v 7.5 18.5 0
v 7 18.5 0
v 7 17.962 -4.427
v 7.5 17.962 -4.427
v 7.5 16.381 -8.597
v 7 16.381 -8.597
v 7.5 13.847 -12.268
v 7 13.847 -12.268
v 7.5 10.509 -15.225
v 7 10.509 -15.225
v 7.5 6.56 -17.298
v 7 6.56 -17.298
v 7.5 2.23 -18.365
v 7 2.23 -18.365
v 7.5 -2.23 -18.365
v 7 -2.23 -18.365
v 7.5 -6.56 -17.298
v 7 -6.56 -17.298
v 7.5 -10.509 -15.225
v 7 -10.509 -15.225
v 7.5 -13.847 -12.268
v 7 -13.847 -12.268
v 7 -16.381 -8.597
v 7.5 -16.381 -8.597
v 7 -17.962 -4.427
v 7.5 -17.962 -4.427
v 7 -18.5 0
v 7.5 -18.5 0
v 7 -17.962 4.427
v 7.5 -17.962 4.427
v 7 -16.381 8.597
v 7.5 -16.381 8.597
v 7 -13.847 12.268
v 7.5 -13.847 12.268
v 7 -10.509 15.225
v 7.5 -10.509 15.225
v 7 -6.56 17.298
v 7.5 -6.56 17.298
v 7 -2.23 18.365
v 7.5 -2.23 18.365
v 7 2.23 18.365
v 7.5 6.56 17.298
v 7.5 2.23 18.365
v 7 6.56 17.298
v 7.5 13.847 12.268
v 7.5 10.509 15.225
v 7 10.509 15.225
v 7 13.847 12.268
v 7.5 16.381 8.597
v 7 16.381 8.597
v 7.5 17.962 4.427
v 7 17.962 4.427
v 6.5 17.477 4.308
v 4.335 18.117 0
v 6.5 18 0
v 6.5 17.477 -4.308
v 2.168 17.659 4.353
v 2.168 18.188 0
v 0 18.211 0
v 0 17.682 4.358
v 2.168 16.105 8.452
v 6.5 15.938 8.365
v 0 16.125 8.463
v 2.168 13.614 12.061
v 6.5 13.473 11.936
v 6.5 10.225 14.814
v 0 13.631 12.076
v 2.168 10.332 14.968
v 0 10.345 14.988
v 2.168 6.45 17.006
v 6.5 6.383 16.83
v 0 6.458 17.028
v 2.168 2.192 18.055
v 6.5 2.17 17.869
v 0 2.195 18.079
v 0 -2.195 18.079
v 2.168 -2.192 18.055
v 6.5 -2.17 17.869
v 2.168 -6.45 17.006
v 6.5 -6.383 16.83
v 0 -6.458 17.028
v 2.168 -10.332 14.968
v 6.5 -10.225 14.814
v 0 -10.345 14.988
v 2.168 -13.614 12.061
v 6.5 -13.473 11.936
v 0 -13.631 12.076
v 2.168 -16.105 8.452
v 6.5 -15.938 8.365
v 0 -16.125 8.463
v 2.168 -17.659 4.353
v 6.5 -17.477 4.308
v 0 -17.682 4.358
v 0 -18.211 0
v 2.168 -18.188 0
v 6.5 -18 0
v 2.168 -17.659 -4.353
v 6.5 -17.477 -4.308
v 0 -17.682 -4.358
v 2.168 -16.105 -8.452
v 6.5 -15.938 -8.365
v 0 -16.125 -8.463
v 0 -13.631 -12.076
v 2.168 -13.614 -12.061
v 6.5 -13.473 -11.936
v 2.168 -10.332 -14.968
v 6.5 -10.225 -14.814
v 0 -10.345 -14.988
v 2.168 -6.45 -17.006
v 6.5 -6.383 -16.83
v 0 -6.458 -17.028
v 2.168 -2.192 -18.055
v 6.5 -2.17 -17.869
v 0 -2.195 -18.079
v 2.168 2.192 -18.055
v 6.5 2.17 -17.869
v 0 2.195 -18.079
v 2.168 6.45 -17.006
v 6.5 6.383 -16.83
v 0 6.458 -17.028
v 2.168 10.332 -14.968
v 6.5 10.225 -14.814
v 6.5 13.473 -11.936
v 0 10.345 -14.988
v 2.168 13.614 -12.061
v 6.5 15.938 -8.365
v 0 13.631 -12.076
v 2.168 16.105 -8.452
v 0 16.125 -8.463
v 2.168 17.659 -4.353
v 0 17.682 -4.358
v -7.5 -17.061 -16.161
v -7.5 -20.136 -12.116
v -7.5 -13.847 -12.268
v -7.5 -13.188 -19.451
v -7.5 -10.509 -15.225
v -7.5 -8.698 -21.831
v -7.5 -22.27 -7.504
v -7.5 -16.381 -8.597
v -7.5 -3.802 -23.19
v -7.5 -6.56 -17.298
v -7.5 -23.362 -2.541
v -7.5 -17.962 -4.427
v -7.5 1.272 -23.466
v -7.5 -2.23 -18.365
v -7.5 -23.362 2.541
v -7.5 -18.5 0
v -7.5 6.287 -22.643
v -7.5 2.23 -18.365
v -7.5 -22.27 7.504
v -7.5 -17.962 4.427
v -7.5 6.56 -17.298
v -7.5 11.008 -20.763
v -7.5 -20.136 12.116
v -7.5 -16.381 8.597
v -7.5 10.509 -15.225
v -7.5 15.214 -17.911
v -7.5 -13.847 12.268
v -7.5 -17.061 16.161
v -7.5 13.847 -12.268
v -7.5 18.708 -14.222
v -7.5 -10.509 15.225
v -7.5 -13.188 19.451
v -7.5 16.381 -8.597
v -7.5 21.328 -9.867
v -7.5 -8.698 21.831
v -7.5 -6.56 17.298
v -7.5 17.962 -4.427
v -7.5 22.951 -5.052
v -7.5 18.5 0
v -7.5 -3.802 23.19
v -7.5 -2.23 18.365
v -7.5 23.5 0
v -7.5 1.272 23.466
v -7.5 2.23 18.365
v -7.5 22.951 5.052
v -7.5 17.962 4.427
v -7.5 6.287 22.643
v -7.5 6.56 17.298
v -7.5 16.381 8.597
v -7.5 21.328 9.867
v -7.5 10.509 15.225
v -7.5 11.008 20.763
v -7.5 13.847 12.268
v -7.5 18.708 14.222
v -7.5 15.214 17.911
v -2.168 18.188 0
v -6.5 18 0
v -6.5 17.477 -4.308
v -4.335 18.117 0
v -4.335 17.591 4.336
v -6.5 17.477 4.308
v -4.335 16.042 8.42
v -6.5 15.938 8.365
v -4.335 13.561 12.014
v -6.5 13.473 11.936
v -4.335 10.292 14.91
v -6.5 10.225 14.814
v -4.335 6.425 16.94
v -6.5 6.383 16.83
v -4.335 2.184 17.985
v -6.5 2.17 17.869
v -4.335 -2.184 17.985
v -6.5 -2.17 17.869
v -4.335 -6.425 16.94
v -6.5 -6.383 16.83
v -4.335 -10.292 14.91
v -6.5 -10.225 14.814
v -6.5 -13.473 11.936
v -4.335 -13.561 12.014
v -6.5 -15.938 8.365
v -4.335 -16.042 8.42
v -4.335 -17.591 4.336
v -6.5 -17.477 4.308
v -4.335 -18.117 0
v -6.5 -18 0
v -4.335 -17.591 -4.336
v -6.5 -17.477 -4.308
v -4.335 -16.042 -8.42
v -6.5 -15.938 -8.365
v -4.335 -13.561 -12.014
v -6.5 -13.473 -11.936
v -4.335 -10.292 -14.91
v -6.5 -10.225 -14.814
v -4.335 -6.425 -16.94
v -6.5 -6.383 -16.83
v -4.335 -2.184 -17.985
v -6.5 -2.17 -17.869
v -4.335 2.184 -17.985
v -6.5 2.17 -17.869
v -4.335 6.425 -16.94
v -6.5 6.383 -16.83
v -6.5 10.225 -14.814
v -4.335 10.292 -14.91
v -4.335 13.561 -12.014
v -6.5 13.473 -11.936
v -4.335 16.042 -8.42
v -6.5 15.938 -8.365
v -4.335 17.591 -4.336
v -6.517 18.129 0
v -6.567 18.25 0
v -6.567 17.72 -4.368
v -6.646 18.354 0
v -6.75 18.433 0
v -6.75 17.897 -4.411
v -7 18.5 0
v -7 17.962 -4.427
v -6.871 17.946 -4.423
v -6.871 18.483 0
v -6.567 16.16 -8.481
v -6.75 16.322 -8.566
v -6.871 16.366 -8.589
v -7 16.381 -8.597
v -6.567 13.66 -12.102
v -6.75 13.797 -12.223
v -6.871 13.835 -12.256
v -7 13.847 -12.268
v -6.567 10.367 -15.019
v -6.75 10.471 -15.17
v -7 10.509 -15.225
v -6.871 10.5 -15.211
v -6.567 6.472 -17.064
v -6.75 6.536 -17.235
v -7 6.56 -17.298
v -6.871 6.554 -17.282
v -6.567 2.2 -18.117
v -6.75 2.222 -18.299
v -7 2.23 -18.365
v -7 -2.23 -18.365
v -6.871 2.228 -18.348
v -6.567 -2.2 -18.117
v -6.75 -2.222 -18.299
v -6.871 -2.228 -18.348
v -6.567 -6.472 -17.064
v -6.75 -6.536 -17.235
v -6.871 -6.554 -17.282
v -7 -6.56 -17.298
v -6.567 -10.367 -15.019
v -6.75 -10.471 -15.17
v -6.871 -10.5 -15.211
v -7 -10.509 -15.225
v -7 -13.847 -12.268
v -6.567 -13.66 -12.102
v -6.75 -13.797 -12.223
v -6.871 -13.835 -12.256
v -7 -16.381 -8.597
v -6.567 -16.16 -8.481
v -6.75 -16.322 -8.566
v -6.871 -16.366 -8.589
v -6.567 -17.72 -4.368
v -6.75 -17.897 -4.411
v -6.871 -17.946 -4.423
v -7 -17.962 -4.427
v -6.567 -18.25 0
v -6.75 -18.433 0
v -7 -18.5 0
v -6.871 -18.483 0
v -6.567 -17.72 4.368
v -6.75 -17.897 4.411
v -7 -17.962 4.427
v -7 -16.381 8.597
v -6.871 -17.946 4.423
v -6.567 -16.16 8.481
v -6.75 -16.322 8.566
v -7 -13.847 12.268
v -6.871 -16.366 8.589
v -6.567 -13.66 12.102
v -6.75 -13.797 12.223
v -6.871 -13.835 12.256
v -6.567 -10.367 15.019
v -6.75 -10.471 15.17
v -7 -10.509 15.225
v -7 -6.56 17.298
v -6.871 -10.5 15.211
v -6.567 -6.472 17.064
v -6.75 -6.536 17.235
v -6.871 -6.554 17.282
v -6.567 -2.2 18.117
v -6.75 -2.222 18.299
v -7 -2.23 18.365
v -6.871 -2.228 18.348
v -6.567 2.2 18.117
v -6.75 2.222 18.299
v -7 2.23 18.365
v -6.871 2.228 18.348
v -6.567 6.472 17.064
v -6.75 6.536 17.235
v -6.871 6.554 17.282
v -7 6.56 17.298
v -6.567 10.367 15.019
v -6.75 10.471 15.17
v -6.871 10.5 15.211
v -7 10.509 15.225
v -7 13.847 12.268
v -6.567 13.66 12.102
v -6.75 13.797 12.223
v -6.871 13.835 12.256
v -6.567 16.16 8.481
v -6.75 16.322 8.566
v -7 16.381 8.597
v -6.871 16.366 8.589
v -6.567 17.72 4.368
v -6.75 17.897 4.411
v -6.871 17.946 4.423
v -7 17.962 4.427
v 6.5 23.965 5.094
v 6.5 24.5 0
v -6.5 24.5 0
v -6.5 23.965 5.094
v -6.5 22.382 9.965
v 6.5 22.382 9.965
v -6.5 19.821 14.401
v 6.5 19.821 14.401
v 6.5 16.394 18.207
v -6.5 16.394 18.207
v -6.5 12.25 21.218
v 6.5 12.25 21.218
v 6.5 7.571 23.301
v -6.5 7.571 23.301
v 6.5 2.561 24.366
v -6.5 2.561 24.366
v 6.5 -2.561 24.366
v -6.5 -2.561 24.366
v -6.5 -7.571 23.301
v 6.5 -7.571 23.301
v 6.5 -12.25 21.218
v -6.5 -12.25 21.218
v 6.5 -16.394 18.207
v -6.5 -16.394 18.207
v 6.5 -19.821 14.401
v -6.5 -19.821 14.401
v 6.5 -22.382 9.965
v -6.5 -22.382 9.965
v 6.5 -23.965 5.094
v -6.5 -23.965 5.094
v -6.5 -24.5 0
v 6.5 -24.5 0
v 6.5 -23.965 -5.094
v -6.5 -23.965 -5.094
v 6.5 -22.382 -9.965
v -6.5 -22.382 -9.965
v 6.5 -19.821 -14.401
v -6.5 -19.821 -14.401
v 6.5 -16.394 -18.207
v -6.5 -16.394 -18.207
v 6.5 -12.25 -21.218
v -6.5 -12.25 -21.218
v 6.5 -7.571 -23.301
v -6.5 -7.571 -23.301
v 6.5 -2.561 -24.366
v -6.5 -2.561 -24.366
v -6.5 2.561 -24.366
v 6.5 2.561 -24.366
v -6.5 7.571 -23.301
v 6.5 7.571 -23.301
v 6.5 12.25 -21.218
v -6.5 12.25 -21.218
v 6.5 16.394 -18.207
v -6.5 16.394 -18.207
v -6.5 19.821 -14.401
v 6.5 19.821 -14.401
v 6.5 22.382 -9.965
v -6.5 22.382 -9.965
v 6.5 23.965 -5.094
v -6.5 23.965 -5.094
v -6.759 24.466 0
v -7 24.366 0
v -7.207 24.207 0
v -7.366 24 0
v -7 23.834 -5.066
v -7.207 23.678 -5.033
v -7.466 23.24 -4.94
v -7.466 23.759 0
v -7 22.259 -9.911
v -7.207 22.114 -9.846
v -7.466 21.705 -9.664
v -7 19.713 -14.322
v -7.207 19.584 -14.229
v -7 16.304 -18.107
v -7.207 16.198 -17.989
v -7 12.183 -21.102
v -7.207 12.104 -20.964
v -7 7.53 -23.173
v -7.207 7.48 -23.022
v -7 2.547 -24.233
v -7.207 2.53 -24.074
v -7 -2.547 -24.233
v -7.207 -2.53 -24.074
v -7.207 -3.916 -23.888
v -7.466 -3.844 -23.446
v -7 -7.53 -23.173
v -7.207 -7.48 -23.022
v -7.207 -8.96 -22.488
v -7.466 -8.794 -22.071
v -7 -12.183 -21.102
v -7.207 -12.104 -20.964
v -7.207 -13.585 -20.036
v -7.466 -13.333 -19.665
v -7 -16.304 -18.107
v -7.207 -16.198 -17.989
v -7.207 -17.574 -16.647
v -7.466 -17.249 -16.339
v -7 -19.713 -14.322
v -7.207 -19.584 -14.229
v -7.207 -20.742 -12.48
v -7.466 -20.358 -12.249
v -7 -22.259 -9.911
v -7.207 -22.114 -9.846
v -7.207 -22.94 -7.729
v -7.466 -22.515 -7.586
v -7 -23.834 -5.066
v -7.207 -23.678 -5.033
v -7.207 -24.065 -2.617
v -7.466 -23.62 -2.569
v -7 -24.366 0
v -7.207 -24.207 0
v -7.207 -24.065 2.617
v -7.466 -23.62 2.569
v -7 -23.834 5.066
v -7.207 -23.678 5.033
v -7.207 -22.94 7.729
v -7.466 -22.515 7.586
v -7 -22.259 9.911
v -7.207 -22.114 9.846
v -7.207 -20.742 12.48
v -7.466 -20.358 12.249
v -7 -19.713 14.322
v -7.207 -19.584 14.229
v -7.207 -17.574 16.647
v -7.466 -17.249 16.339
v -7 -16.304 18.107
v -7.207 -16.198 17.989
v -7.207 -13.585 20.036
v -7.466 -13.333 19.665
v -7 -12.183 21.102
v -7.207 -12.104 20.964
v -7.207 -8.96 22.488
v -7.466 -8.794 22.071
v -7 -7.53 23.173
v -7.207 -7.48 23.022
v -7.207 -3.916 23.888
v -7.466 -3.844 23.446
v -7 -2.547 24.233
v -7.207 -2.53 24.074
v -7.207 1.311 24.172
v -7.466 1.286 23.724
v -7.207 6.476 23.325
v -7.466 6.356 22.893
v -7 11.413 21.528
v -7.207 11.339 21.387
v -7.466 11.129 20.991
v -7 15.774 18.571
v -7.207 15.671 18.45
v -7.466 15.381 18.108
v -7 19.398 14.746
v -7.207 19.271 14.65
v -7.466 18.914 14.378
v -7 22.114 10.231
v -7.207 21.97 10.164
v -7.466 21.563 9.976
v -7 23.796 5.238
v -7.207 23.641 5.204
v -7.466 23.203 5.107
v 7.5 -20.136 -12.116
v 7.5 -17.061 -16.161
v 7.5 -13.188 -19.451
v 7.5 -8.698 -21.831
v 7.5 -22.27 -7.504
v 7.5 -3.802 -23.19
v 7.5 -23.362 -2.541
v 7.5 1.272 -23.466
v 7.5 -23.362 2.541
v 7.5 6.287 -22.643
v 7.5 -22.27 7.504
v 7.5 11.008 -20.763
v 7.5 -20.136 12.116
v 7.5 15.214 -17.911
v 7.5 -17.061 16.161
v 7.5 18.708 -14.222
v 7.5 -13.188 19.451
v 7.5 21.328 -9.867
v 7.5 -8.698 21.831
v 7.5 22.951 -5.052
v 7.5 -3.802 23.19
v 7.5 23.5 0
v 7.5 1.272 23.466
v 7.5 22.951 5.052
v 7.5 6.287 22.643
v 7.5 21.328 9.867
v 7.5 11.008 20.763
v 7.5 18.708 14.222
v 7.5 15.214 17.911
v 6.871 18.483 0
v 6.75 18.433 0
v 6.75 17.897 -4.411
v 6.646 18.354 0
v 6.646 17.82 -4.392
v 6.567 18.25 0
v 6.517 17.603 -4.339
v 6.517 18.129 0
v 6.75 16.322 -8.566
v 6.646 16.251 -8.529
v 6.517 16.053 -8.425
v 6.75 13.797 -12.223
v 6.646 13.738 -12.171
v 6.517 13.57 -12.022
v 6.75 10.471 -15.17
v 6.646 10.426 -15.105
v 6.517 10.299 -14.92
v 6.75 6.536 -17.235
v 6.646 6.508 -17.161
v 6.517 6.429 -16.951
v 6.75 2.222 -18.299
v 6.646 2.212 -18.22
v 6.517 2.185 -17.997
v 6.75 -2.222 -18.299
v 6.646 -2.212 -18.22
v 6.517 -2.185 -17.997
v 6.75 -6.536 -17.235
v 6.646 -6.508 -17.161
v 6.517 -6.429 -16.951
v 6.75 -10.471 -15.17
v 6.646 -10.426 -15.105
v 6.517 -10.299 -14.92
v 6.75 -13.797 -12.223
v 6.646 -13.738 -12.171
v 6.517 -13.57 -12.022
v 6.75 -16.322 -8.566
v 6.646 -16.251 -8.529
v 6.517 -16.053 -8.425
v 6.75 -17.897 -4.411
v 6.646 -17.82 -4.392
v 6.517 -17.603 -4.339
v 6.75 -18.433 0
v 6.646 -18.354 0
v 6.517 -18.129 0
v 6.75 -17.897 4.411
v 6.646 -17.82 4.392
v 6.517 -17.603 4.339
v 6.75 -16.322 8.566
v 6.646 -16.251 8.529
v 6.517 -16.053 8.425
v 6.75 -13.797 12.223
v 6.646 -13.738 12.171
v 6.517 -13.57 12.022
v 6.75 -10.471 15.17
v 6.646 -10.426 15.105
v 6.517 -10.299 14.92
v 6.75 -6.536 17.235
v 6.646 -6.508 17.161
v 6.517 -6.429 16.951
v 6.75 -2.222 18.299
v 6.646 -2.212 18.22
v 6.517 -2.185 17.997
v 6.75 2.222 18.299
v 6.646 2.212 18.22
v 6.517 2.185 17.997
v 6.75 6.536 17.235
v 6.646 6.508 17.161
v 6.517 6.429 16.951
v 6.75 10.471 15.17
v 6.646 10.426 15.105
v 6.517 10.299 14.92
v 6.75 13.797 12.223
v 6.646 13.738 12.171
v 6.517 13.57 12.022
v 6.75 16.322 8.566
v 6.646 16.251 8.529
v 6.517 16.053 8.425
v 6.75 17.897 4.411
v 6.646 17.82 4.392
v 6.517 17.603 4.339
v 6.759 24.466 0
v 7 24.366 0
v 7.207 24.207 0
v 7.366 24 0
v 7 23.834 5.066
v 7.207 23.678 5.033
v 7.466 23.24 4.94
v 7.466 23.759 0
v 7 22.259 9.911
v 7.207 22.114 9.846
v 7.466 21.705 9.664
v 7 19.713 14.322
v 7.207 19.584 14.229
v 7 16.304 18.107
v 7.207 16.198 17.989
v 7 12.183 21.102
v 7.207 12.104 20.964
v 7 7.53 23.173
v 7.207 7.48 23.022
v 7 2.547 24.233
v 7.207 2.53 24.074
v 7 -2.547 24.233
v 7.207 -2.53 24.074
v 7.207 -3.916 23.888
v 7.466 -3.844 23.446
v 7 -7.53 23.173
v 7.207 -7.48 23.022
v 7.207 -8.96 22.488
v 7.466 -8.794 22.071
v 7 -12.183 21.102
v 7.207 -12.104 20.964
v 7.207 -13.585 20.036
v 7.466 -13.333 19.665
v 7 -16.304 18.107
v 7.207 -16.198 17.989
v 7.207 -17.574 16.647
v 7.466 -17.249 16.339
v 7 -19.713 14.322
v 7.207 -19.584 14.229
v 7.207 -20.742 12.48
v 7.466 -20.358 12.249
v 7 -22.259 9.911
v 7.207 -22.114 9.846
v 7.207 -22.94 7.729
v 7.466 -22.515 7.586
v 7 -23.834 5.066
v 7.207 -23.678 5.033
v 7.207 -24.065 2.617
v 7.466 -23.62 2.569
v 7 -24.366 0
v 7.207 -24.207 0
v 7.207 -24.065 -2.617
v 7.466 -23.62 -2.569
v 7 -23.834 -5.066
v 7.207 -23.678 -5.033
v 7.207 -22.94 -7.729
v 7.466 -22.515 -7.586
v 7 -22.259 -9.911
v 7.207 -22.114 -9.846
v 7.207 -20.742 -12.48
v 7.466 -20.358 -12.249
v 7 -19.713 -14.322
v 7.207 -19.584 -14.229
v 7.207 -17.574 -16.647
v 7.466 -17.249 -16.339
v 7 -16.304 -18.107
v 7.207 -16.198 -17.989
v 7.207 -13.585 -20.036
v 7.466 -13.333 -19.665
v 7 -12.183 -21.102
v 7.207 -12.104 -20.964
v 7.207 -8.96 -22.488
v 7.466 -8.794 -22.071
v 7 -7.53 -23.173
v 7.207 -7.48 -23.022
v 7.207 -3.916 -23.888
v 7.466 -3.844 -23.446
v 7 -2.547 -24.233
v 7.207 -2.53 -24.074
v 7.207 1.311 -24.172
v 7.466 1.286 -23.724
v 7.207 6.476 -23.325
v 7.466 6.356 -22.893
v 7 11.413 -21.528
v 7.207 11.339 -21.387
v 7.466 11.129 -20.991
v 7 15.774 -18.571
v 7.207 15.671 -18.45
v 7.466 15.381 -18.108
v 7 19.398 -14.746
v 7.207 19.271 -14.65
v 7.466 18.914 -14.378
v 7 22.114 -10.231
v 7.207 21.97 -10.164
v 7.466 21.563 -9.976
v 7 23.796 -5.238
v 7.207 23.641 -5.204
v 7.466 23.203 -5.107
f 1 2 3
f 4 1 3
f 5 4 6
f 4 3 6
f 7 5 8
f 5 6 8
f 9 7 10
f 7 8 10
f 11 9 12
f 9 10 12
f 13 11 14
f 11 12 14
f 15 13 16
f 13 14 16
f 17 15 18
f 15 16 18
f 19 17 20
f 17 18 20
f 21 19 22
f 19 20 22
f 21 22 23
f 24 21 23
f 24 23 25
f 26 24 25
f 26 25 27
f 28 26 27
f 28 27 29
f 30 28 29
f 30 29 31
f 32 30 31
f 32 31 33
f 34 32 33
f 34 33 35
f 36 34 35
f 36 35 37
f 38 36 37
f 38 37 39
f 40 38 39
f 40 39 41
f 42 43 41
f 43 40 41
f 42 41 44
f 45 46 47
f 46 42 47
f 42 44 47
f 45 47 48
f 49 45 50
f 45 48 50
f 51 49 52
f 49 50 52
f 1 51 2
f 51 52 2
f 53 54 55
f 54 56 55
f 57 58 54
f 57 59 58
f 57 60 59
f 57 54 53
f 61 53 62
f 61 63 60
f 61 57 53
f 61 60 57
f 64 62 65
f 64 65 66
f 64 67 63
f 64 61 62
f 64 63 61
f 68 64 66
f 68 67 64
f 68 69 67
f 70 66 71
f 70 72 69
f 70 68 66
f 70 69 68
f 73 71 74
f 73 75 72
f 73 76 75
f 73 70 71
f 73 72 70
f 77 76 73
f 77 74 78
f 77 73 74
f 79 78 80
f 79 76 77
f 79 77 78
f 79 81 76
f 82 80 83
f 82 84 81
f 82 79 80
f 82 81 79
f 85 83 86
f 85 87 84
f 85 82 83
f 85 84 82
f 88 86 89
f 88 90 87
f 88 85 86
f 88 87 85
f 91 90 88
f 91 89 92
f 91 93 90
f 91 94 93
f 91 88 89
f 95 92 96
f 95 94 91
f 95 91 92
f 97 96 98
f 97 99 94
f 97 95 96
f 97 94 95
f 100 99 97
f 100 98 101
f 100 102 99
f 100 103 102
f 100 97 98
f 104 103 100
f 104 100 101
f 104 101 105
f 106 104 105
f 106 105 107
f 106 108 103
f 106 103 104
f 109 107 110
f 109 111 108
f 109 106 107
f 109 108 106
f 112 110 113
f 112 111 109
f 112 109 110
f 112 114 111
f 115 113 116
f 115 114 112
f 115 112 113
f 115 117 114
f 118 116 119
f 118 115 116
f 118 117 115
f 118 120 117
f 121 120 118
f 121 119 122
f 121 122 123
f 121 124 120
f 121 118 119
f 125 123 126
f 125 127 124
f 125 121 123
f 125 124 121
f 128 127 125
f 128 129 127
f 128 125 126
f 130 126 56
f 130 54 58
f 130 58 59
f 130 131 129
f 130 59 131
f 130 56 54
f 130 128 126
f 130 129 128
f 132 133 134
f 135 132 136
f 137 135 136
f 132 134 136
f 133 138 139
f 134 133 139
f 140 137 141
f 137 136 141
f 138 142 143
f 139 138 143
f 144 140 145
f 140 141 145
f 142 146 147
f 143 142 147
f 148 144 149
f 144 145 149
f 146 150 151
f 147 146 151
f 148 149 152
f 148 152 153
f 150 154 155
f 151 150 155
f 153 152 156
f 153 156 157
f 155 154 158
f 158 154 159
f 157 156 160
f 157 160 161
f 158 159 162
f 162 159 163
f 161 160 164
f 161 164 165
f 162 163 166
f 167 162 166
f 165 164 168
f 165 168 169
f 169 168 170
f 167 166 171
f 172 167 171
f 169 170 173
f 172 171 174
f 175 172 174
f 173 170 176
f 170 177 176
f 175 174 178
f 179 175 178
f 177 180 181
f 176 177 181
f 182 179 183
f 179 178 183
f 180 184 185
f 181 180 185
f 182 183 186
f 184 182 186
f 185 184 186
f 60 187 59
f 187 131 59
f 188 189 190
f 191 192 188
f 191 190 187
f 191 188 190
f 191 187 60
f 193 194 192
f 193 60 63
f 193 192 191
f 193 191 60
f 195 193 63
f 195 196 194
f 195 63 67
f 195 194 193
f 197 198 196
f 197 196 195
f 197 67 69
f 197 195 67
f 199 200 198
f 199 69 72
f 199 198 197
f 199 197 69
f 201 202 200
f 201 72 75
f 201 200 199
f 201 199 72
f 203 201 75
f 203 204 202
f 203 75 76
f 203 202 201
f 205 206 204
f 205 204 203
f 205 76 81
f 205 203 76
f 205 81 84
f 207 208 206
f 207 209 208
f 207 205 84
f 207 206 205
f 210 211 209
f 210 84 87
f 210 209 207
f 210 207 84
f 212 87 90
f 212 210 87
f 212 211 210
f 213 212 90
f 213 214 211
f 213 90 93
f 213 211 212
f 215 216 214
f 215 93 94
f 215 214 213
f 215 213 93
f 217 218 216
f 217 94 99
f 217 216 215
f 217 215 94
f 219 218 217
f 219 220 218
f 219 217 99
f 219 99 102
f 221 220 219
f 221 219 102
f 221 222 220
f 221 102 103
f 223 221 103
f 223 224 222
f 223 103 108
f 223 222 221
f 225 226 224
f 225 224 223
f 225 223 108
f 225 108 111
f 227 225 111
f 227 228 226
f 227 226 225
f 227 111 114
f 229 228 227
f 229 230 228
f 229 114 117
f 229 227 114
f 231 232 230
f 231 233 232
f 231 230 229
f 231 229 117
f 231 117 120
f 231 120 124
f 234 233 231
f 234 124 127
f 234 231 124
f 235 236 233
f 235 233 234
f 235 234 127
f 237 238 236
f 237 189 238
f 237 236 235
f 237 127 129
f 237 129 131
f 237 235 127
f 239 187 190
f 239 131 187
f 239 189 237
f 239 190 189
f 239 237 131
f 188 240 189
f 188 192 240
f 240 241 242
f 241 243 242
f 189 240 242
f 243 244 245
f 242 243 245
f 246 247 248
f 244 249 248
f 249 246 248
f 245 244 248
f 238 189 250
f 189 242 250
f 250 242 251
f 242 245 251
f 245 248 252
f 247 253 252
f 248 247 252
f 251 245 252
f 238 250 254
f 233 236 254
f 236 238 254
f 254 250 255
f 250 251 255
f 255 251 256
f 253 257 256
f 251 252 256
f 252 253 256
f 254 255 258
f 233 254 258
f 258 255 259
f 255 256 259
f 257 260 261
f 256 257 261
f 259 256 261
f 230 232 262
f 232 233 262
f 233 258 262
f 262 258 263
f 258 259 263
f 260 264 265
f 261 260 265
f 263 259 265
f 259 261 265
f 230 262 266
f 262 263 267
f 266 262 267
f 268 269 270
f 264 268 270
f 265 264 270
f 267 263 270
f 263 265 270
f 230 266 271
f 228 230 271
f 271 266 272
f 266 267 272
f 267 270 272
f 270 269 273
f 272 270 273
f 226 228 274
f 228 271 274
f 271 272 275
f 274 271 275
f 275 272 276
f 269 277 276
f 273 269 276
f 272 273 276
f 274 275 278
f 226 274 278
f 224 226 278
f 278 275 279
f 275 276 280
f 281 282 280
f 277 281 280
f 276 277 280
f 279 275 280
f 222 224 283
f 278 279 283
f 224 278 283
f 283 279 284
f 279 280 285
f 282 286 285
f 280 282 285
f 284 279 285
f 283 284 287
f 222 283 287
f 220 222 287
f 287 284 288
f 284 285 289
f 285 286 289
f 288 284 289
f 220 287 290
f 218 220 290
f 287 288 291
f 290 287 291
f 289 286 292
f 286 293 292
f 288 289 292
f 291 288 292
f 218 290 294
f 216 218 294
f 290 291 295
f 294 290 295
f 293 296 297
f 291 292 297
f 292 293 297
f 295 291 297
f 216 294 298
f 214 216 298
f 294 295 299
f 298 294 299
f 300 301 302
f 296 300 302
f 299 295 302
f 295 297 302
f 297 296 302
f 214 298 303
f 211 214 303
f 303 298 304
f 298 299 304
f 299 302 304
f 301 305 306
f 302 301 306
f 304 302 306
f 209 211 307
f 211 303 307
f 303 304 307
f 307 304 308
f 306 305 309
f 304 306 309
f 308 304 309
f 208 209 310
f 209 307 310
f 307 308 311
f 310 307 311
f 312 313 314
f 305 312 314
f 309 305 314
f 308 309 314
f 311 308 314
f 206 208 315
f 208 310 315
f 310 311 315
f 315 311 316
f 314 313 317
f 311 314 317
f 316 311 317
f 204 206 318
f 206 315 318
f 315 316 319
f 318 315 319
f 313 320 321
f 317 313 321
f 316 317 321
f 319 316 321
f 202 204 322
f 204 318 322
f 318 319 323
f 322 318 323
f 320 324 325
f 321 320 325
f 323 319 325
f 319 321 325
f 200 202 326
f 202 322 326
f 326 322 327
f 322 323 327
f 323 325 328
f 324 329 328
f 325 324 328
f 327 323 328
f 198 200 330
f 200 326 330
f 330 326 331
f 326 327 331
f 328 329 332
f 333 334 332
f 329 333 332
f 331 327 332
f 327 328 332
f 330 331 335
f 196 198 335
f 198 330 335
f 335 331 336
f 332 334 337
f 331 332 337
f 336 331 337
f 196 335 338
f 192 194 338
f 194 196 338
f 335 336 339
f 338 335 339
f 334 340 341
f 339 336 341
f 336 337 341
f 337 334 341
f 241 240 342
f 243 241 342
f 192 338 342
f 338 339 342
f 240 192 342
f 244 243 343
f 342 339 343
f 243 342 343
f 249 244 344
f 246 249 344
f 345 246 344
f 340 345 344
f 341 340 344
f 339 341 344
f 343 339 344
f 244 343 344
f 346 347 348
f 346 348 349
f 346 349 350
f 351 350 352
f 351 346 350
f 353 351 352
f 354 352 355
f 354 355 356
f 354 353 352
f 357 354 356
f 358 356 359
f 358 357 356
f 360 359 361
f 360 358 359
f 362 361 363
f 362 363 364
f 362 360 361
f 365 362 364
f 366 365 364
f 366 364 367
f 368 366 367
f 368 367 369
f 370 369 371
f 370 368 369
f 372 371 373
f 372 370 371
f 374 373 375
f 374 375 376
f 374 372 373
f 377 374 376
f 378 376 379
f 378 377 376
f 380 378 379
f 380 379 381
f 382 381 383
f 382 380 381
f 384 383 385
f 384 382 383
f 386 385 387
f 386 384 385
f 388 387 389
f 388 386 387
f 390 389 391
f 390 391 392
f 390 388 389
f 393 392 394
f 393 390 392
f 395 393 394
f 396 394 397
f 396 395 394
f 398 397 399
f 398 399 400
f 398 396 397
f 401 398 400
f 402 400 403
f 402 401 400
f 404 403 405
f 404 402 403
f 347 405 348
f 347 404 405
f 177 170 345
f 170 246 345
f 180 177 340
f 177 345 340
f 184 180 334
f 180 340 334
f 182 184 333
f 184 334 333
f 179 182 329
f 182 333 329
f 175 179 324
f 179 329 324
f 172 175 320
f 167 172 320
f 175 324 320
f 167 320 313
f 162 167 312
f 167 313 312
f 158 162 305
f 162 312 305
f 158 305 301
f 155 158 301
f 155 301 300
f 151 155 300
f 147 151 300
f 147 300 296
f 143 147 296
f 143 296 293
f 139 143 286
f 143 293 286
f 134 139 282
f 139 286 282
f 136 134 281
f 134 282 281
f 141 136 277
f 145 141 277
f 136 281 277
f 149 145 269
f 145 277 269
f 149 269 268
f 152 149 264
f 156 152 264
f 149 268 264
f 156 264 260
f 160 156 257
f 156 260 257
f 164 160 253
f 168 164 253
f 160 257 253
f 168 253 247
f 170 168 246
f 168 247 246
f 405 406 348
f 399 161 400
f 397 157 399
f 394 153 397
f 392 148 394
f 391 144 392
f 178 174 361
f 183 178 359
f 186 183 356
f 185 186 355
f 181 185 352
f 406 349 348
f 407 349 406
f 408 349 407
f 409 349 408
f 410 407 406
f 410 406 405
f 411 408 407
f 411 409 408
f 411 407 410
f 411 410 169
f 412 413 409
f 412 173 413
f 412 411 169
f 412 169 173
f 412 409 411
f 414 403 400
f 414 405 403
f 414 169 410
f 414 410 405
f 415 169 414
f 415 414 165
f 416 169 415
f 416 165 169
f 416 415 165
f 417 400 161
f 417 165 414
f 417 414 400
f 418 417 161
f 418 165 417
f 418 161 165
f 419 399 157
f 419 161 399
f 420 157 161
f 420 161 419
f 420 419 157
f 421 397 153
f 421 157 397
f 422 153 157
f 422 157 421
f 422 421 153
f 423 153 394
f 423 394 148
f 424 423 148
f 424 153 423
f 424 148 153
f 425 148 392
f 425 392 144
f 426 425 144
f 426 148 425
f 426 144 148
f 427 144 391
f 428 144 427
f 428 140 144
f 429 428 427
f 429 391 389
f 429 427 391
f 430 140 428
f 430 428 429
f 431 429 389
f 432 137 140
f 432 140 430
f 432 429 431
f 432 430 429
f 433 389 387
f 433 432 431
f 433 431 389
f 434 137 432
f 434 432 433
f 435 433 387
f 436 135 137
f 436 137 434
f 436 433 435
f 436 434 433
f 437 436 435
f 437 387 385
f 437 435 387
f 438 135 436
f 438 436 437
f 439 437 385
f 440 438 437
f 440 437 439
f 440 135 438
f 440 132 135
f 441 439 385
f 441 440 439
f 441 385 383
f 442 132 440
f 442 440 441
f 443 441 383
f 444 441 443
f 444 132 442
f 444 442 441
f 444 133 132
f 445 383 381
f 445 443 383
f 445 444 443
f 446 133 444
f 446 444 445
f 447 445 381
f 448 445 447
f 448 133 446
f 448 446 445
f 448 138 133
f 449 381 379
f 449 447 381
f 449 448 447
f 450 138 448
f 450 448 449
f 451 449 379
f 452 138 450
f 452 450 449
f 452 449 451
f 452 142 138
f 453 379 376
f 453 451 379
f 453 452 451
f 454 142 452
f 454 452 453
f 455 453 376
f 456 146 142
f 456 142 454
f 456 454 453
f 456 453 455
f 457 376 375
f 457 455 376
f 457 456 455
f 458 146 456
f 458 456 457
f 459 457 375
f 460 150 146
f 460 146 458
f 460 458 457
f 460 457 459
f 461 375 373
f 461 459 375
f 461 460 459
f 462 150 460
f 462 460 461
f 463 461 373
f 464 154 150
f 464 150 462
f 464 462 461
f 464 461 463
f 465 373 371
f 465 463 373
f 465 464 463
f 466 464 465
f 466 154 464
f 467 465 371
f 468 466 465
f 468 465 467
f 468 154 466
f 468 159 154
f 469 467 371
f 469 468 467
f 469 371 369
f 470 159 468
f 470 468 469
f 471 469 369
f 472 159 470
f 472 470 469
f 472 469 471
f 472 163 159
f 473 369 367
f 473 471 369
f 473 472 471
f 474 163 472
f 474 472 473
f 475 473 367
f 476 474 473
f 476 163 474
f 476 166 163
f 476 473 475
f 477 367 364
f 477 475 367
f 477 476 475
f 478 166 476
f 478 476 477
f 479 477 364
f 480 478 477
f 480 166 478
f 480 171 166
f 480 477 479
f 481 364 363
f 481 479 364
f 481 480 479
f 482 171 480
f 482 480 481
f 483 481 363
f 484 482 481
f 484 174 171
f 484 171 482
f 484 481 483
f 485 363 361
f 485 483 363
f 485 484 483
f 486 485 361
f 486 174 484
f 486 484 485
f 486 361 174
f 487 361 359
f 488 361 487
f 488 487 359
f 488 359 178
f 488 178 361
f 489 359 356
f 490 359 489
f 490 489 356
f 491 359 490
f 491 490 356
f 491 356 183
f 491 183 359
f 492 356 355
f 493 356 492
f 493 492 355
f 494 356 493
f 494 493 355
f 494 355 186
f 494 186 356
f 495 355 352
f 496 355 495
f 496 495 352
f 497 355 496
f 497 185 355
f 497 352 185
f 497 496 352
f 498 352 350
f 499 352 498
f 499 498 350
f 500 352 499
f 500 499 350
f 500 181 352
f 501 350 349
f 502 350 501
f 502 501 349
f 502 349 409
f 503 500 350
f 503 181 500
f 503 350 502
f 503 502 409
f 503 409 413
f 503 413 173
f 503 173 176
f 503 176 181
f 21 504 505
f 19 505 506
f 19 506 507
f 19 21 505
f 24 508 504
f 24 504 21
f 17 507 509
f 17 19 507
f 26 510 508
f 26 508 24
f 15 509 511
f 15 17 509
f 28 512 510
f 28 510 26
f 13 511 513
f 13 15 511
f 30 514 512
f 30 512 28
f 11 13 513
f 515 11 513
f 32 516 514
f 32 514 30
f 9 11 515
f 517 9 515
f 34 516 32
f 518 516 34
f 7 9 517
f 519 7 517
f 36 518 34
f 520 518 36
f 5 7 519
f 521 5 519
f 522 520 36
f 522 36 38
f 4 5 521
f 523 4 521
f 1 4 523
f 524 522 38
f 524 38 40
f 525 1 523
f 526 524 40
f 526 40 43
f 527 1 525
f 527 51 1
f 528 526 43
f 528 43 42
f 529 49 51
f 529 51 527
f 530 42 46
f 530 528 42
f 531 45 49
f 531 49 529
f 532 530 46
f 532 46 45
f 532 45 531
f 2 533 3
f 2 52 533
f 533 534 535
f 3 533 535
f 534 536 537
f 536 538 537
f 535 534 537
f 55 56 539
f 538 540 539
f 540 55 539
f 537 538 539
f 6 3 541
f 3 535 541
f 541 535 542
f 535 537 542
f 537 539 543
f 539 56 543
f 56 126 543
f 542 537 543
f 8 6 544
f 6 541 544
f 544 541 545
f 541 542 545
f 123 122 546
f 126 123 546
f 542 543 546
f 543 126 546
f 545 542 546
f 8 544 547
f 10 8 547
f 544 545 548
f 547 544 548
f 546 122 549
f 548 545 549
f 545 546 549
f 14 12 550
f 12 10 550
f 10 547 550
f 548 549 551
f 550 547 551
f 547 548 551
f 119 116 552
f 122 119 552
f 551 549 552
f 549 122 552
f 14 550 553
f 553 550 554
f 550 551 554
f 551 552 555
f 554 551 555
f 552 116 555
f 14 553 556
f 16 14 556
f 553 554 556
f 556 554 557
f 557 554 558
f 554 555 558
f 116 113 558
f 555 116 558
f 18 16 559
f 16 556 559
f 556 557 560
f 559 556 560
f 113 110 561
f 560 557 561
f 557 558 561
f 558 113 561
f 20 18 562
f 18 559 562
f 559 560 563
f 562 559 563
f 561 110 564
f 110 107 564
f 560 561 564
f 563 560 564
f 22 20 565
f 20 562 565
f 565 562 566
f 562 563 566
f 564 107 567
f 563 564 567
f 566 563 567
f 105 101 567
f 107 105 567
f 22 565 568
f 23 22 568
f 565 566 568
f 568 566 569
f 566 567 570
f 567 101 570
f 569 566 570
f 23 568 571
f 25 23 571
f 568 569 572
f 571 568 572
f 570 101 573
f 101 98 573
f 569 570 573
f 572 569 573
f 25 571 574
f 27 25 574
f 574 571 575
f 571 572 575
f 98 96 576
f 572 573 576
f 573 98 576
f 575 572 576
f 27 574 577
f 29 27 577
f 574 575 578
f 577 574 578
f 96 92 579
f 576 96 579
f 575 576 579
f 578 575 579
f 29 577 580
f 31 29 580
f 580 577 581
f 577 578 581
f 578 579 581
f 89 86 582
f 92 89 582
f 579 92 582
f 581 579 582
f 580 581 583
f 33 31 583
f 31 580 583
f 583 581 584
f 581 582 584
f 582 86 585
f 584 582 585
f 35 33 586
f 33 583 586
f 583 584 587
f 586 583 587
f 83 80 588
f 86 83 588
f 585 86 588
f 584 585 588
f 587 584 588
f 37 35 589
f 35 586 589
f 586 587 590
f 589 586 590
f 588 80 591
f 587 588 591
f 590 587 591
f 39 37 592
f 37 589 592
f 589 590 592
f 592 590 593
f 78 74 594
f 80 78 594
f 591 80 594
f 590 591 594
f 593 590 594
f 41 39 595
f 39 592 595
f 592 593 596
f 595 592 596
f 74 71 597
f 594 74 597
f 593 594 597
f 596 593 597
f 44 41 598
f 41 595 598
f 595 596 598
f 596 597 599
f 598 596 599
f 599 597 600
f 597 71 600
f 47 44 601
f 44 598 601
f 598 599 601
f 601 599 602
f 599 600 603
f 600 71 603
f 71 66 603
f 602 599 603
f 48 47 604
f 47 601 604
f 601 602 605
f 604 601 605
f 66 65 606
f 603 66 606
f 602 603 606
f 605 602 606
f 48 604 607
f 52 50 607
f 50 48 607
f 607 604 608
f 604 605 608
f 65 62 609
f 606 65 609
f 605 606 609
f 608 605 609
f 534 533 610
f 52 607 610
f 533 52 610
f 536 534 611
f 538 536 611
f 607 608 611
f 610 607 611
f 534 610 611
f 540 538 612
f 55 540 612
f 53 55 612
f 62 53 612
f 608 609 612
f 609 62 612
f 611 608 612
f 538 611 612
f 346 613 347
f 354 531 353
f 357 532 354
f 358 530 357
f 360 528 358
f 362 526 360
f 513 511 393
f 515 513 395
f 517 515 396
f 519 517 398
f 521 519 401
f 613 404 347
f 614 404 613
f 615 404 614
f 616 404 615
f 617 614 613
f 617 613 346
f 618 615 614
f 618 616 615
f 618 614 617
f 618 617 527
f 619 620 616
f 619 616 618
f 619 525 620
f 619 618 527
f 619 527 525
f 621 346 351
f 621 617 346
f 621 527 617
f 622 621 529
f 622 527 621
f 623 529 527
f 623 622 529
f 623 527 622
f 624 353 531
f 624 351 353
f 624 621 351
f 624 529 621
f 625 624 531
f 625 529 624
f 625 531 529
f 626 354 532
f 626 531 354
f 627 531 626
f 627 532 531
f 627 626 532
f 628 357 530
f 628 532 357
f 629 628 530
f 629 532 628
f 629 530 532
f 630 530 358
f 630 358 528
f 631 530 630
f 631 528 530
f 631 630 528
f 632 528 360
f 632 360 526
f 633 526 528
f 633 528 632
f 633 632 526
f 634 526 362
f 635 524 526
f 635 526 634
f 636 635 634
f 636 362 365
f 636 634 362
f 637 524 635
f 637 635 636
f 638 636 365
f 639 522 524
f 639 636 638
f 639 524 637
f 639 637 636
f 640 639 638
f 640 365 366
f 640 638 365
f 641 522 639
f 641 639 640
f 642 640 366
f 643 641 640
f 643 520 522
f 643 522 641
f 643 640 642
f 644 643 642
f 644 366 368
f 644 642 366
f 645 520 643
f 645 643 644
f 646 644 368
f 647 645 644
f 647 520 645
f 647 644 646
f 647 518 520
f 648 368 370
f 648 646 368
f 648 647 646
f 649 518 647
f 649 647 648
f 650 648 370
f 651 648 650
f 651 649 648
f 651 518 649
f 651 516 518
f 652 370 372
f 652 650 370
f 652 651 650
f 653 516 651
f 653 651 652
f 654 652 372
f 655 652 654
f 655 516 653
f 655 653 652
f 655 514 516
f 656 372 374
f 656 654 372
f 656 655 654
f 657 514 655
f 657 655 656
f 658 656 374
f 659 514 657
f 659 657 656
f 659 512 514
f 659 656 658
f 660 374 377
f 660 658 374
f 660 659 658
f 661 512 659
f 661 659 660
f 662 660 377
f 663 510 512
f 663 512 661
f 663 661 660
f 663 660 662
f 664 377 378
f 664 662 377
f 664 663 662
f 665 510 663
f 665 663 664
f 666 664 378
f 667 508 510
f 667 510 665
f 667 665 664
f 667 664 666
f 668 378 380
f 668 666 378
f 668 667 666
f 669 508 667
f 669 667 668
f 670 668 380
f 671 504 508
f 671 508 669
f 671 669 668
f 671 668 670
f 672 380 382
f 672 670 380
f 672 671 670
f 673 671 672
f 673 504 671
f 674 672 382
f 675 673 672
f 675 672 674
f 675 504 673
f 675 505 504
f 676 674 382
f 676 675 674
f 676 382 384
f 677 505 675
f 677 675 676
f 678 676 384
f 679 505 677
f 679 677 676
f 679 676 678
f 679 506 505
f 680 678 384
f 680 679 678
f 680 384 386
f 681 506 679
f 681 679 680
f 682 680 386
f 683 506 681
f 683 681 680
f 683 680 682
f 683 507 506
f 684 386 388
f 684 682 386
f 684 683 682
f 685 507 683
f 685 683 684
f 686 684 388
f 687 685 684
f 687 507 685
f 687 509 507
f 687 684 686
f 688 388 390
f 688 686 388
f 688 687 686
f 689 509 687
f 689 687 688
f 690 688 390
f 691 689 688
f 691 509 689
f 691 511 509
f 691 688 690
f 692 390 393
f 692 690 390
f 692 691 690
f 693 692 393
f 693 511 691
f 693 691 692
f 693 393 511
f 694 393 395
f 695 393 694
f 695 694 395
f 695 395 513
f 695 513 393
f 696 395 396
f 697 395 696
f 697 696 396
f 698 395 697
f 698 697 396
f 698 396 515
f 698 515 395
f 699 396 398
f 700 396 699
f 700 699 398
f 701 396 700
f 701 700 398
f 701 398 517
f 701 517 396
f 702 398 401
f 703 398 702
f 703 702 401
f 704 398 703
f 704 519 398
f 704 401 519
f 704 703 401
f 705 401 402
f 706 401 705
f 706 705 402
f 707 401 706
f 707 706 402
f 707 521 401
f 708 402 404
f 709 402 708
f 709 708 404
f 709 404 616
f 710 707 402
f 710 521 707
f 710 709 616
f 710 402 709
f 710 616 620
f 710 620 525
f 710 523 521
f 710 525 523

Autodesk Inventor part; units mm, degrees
ref_plane "YZ Plane" through (0, 0, 0) normal (1, 0, 0) x (0, 1, 0)
ref_plane "XZ Plane" through (0, 0, 0) normal (0, 1, 0) x (-1, 0, 0)
ref_plane "XY Plane" through (0, 0, 0) normal (0, 0, 1) x (1, 0, 0)
sketch "草图1" plane through (0, 0, 0) normal (0, 0, 1) x (1, 0, 0)
  line L0 (-7.5, 24.5) -> (7.5, 24.5)
  line L1 (-10.9677, 0) -> (10.5779, 0) projected
  line L2 (0, -103.0462) -> (0, 45.7577) projected
  line L3 (-7.5, 24.5) -> (-7.5, 18.5)
  line L4 (-7.5, 18.5) -> (-7, 18.5)
  arc A0 (-6.5, 18) -> (-7, 18.5) centre (-7, 18) ccw
  line L5 (-7, 18) -> (-7.8897, 18) construction
  line L6 (7.5, 24.5) -> (7.5, 18.5)
  line L7 (7.5, 18.5) -> (7, 18.5)
  arc A1 (7, 18.5) -> (6.5, 18) centre (7, 18) ccw
  arc A2 (6.5, 18) -> (-6.5, 18) centre (0, -81.7885) ccw
  point P0 (0, 0)
  dimension "d1" = 0.5
  dimension "d2" = 6
  dimension "d3" = 1
  dimension "d4" = 24.5
  dimension "d11" = 15
  dimension "d13" = 100
  dimension "d14" = 18
revolve "旋转1" add sketch "草图1" angle 360 about axis through (-10, 0, 0) along (1, 0, 0)
fillet "圆角1" radius 1 2 edges at (-7.5, -24.5, 0) (7.5, -24.5, 0)
properties part number "橡胶外轮设计" material "橡胶"
